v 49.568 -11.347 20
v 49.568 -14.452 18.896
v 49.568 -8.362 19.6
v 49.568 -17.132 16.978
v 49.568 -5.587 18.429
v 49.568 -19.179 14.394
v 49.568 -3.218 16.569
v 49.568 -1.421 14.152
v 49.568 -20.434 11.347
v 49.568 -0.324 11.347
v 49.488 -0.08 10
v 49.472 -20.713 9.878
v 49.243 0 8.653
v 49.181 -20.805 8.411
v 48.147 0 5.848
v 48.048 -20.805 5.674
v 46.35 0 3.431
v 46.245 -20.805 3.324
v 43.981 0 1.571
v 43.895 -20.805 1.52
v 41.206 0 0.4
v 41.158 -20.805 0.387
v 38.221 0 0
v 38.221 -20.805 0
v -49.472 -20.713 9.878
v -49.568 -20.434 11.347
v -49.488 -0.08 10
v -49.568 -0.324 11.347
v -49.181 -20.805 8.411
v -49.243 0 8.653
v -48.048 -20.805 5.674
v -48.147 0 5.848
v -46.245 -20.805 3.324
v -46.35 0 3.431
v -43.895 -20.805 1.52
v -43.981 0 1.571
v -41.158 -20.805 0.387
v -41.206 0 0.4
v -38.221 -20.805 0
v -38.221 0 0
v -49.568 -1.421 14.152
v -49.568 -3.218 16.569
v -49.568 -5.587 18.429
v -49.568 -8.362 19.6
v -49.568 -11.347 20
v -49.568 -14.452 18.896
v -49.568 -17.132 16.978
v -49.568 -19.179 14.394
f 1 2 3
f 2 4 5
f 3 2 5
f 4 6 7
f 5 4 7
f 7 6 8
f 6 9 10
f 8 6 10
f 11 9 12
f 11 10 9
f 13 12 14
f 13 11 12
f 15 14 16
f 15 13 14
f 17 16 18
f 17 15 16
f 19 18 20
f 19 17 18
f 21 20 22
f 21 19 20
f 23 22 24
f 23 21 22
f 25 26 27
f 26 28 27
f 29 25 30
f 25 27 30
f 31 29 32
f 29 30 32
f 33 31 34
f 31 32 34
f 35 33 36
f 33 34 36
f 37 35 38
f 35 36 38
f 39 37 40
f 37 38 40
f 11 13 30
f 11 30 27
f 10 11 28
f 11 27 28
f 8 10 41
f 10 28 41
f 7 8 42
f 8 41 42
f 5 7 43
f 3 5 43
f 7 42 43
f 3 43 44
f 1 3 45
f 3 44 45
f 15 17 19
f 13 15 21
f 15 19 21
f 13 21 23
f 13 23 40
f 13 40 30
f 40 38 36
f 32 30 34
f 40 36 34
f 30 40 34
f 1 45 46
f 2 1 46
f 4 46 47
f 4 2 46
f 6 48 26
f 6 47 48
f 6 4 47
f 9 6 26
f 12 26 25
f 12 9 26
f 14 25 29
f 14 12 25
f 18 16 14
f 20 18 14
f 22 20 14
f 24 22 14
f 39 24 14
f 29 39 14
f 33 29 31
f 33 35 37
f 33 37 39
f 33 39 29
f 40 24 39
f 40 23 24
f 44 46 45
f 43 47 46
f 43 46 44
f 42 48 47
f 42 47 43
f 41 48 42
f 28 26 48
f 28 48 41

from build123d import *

# Parameters (mm, degrees)
F0_W        = 49.567822367
F0_H        = 20.8045206964
F1_DEPTH    = 20
F2_R        = 11.3468037432
F3_T1_DEPTH = 107.5148856448
F4_R        = 11.3468037432


# Not quite as in the source:
# - a fillet or chamfer that OpenCascade refuses, or shapes differently, is made with other operations: its cross-section is extruded or revolved along the edge and cut away or added


with BuildPart() as f1:
    # F0 (on Top) → F1 (new body)
    with BuildSketch(Plane.XY):
        with Locations((-24.7839111835, -10.4022603482)):
            Rectangle(F0_W, F0_H)
    extrude(amount=F1_DEPTH)

    # F2
    f2_edges = [f1.edges().sort_by_distance(p)[0] for p in [
        (-24.783911, 0, 20),
    ]]
    fillet(f2_edges, radius=F2_R)

    # F3: fillet of radius 11.8296464556 on 1 edges, made by hand

    # F3_s2 → F3_t1 (cut)
    with BuildSketch(Plane.YZ.offset(-78.5413540059)):
        with BuildLine():
            ThreePointArc((-11.3468037432, 20), (-18.1400153389, 15.8899405195), (-20.8045206964, 8.4105873444))
            Line((-20.8045206964, 8.4105873444), (-20.8045206964, 20))
            Line((-20.8045206964, 20), (-11.3468037432, 20))
        make_face()
    extrude(amount=F3_T1_DEPTH, mode=Mode.SUBTRACT)

    # F4
    f4_edges = [f1.edges().sort_by_distance(p)[0] for p in [
        (-49.567822, -10.40226, 0),
    ]]
    fillet(f4_edges, radius=F4_R)

    # F5: F1 across face


with BuildPart() as f1_1:
    add(f1.part)
    add(f1.part.mirror(Plane(origin=(0, -10.3947828822, 8.8652235267), x_dir=(0, 1, 0), z_dir=(1, 0, 0))))


solid = f1_1.part
